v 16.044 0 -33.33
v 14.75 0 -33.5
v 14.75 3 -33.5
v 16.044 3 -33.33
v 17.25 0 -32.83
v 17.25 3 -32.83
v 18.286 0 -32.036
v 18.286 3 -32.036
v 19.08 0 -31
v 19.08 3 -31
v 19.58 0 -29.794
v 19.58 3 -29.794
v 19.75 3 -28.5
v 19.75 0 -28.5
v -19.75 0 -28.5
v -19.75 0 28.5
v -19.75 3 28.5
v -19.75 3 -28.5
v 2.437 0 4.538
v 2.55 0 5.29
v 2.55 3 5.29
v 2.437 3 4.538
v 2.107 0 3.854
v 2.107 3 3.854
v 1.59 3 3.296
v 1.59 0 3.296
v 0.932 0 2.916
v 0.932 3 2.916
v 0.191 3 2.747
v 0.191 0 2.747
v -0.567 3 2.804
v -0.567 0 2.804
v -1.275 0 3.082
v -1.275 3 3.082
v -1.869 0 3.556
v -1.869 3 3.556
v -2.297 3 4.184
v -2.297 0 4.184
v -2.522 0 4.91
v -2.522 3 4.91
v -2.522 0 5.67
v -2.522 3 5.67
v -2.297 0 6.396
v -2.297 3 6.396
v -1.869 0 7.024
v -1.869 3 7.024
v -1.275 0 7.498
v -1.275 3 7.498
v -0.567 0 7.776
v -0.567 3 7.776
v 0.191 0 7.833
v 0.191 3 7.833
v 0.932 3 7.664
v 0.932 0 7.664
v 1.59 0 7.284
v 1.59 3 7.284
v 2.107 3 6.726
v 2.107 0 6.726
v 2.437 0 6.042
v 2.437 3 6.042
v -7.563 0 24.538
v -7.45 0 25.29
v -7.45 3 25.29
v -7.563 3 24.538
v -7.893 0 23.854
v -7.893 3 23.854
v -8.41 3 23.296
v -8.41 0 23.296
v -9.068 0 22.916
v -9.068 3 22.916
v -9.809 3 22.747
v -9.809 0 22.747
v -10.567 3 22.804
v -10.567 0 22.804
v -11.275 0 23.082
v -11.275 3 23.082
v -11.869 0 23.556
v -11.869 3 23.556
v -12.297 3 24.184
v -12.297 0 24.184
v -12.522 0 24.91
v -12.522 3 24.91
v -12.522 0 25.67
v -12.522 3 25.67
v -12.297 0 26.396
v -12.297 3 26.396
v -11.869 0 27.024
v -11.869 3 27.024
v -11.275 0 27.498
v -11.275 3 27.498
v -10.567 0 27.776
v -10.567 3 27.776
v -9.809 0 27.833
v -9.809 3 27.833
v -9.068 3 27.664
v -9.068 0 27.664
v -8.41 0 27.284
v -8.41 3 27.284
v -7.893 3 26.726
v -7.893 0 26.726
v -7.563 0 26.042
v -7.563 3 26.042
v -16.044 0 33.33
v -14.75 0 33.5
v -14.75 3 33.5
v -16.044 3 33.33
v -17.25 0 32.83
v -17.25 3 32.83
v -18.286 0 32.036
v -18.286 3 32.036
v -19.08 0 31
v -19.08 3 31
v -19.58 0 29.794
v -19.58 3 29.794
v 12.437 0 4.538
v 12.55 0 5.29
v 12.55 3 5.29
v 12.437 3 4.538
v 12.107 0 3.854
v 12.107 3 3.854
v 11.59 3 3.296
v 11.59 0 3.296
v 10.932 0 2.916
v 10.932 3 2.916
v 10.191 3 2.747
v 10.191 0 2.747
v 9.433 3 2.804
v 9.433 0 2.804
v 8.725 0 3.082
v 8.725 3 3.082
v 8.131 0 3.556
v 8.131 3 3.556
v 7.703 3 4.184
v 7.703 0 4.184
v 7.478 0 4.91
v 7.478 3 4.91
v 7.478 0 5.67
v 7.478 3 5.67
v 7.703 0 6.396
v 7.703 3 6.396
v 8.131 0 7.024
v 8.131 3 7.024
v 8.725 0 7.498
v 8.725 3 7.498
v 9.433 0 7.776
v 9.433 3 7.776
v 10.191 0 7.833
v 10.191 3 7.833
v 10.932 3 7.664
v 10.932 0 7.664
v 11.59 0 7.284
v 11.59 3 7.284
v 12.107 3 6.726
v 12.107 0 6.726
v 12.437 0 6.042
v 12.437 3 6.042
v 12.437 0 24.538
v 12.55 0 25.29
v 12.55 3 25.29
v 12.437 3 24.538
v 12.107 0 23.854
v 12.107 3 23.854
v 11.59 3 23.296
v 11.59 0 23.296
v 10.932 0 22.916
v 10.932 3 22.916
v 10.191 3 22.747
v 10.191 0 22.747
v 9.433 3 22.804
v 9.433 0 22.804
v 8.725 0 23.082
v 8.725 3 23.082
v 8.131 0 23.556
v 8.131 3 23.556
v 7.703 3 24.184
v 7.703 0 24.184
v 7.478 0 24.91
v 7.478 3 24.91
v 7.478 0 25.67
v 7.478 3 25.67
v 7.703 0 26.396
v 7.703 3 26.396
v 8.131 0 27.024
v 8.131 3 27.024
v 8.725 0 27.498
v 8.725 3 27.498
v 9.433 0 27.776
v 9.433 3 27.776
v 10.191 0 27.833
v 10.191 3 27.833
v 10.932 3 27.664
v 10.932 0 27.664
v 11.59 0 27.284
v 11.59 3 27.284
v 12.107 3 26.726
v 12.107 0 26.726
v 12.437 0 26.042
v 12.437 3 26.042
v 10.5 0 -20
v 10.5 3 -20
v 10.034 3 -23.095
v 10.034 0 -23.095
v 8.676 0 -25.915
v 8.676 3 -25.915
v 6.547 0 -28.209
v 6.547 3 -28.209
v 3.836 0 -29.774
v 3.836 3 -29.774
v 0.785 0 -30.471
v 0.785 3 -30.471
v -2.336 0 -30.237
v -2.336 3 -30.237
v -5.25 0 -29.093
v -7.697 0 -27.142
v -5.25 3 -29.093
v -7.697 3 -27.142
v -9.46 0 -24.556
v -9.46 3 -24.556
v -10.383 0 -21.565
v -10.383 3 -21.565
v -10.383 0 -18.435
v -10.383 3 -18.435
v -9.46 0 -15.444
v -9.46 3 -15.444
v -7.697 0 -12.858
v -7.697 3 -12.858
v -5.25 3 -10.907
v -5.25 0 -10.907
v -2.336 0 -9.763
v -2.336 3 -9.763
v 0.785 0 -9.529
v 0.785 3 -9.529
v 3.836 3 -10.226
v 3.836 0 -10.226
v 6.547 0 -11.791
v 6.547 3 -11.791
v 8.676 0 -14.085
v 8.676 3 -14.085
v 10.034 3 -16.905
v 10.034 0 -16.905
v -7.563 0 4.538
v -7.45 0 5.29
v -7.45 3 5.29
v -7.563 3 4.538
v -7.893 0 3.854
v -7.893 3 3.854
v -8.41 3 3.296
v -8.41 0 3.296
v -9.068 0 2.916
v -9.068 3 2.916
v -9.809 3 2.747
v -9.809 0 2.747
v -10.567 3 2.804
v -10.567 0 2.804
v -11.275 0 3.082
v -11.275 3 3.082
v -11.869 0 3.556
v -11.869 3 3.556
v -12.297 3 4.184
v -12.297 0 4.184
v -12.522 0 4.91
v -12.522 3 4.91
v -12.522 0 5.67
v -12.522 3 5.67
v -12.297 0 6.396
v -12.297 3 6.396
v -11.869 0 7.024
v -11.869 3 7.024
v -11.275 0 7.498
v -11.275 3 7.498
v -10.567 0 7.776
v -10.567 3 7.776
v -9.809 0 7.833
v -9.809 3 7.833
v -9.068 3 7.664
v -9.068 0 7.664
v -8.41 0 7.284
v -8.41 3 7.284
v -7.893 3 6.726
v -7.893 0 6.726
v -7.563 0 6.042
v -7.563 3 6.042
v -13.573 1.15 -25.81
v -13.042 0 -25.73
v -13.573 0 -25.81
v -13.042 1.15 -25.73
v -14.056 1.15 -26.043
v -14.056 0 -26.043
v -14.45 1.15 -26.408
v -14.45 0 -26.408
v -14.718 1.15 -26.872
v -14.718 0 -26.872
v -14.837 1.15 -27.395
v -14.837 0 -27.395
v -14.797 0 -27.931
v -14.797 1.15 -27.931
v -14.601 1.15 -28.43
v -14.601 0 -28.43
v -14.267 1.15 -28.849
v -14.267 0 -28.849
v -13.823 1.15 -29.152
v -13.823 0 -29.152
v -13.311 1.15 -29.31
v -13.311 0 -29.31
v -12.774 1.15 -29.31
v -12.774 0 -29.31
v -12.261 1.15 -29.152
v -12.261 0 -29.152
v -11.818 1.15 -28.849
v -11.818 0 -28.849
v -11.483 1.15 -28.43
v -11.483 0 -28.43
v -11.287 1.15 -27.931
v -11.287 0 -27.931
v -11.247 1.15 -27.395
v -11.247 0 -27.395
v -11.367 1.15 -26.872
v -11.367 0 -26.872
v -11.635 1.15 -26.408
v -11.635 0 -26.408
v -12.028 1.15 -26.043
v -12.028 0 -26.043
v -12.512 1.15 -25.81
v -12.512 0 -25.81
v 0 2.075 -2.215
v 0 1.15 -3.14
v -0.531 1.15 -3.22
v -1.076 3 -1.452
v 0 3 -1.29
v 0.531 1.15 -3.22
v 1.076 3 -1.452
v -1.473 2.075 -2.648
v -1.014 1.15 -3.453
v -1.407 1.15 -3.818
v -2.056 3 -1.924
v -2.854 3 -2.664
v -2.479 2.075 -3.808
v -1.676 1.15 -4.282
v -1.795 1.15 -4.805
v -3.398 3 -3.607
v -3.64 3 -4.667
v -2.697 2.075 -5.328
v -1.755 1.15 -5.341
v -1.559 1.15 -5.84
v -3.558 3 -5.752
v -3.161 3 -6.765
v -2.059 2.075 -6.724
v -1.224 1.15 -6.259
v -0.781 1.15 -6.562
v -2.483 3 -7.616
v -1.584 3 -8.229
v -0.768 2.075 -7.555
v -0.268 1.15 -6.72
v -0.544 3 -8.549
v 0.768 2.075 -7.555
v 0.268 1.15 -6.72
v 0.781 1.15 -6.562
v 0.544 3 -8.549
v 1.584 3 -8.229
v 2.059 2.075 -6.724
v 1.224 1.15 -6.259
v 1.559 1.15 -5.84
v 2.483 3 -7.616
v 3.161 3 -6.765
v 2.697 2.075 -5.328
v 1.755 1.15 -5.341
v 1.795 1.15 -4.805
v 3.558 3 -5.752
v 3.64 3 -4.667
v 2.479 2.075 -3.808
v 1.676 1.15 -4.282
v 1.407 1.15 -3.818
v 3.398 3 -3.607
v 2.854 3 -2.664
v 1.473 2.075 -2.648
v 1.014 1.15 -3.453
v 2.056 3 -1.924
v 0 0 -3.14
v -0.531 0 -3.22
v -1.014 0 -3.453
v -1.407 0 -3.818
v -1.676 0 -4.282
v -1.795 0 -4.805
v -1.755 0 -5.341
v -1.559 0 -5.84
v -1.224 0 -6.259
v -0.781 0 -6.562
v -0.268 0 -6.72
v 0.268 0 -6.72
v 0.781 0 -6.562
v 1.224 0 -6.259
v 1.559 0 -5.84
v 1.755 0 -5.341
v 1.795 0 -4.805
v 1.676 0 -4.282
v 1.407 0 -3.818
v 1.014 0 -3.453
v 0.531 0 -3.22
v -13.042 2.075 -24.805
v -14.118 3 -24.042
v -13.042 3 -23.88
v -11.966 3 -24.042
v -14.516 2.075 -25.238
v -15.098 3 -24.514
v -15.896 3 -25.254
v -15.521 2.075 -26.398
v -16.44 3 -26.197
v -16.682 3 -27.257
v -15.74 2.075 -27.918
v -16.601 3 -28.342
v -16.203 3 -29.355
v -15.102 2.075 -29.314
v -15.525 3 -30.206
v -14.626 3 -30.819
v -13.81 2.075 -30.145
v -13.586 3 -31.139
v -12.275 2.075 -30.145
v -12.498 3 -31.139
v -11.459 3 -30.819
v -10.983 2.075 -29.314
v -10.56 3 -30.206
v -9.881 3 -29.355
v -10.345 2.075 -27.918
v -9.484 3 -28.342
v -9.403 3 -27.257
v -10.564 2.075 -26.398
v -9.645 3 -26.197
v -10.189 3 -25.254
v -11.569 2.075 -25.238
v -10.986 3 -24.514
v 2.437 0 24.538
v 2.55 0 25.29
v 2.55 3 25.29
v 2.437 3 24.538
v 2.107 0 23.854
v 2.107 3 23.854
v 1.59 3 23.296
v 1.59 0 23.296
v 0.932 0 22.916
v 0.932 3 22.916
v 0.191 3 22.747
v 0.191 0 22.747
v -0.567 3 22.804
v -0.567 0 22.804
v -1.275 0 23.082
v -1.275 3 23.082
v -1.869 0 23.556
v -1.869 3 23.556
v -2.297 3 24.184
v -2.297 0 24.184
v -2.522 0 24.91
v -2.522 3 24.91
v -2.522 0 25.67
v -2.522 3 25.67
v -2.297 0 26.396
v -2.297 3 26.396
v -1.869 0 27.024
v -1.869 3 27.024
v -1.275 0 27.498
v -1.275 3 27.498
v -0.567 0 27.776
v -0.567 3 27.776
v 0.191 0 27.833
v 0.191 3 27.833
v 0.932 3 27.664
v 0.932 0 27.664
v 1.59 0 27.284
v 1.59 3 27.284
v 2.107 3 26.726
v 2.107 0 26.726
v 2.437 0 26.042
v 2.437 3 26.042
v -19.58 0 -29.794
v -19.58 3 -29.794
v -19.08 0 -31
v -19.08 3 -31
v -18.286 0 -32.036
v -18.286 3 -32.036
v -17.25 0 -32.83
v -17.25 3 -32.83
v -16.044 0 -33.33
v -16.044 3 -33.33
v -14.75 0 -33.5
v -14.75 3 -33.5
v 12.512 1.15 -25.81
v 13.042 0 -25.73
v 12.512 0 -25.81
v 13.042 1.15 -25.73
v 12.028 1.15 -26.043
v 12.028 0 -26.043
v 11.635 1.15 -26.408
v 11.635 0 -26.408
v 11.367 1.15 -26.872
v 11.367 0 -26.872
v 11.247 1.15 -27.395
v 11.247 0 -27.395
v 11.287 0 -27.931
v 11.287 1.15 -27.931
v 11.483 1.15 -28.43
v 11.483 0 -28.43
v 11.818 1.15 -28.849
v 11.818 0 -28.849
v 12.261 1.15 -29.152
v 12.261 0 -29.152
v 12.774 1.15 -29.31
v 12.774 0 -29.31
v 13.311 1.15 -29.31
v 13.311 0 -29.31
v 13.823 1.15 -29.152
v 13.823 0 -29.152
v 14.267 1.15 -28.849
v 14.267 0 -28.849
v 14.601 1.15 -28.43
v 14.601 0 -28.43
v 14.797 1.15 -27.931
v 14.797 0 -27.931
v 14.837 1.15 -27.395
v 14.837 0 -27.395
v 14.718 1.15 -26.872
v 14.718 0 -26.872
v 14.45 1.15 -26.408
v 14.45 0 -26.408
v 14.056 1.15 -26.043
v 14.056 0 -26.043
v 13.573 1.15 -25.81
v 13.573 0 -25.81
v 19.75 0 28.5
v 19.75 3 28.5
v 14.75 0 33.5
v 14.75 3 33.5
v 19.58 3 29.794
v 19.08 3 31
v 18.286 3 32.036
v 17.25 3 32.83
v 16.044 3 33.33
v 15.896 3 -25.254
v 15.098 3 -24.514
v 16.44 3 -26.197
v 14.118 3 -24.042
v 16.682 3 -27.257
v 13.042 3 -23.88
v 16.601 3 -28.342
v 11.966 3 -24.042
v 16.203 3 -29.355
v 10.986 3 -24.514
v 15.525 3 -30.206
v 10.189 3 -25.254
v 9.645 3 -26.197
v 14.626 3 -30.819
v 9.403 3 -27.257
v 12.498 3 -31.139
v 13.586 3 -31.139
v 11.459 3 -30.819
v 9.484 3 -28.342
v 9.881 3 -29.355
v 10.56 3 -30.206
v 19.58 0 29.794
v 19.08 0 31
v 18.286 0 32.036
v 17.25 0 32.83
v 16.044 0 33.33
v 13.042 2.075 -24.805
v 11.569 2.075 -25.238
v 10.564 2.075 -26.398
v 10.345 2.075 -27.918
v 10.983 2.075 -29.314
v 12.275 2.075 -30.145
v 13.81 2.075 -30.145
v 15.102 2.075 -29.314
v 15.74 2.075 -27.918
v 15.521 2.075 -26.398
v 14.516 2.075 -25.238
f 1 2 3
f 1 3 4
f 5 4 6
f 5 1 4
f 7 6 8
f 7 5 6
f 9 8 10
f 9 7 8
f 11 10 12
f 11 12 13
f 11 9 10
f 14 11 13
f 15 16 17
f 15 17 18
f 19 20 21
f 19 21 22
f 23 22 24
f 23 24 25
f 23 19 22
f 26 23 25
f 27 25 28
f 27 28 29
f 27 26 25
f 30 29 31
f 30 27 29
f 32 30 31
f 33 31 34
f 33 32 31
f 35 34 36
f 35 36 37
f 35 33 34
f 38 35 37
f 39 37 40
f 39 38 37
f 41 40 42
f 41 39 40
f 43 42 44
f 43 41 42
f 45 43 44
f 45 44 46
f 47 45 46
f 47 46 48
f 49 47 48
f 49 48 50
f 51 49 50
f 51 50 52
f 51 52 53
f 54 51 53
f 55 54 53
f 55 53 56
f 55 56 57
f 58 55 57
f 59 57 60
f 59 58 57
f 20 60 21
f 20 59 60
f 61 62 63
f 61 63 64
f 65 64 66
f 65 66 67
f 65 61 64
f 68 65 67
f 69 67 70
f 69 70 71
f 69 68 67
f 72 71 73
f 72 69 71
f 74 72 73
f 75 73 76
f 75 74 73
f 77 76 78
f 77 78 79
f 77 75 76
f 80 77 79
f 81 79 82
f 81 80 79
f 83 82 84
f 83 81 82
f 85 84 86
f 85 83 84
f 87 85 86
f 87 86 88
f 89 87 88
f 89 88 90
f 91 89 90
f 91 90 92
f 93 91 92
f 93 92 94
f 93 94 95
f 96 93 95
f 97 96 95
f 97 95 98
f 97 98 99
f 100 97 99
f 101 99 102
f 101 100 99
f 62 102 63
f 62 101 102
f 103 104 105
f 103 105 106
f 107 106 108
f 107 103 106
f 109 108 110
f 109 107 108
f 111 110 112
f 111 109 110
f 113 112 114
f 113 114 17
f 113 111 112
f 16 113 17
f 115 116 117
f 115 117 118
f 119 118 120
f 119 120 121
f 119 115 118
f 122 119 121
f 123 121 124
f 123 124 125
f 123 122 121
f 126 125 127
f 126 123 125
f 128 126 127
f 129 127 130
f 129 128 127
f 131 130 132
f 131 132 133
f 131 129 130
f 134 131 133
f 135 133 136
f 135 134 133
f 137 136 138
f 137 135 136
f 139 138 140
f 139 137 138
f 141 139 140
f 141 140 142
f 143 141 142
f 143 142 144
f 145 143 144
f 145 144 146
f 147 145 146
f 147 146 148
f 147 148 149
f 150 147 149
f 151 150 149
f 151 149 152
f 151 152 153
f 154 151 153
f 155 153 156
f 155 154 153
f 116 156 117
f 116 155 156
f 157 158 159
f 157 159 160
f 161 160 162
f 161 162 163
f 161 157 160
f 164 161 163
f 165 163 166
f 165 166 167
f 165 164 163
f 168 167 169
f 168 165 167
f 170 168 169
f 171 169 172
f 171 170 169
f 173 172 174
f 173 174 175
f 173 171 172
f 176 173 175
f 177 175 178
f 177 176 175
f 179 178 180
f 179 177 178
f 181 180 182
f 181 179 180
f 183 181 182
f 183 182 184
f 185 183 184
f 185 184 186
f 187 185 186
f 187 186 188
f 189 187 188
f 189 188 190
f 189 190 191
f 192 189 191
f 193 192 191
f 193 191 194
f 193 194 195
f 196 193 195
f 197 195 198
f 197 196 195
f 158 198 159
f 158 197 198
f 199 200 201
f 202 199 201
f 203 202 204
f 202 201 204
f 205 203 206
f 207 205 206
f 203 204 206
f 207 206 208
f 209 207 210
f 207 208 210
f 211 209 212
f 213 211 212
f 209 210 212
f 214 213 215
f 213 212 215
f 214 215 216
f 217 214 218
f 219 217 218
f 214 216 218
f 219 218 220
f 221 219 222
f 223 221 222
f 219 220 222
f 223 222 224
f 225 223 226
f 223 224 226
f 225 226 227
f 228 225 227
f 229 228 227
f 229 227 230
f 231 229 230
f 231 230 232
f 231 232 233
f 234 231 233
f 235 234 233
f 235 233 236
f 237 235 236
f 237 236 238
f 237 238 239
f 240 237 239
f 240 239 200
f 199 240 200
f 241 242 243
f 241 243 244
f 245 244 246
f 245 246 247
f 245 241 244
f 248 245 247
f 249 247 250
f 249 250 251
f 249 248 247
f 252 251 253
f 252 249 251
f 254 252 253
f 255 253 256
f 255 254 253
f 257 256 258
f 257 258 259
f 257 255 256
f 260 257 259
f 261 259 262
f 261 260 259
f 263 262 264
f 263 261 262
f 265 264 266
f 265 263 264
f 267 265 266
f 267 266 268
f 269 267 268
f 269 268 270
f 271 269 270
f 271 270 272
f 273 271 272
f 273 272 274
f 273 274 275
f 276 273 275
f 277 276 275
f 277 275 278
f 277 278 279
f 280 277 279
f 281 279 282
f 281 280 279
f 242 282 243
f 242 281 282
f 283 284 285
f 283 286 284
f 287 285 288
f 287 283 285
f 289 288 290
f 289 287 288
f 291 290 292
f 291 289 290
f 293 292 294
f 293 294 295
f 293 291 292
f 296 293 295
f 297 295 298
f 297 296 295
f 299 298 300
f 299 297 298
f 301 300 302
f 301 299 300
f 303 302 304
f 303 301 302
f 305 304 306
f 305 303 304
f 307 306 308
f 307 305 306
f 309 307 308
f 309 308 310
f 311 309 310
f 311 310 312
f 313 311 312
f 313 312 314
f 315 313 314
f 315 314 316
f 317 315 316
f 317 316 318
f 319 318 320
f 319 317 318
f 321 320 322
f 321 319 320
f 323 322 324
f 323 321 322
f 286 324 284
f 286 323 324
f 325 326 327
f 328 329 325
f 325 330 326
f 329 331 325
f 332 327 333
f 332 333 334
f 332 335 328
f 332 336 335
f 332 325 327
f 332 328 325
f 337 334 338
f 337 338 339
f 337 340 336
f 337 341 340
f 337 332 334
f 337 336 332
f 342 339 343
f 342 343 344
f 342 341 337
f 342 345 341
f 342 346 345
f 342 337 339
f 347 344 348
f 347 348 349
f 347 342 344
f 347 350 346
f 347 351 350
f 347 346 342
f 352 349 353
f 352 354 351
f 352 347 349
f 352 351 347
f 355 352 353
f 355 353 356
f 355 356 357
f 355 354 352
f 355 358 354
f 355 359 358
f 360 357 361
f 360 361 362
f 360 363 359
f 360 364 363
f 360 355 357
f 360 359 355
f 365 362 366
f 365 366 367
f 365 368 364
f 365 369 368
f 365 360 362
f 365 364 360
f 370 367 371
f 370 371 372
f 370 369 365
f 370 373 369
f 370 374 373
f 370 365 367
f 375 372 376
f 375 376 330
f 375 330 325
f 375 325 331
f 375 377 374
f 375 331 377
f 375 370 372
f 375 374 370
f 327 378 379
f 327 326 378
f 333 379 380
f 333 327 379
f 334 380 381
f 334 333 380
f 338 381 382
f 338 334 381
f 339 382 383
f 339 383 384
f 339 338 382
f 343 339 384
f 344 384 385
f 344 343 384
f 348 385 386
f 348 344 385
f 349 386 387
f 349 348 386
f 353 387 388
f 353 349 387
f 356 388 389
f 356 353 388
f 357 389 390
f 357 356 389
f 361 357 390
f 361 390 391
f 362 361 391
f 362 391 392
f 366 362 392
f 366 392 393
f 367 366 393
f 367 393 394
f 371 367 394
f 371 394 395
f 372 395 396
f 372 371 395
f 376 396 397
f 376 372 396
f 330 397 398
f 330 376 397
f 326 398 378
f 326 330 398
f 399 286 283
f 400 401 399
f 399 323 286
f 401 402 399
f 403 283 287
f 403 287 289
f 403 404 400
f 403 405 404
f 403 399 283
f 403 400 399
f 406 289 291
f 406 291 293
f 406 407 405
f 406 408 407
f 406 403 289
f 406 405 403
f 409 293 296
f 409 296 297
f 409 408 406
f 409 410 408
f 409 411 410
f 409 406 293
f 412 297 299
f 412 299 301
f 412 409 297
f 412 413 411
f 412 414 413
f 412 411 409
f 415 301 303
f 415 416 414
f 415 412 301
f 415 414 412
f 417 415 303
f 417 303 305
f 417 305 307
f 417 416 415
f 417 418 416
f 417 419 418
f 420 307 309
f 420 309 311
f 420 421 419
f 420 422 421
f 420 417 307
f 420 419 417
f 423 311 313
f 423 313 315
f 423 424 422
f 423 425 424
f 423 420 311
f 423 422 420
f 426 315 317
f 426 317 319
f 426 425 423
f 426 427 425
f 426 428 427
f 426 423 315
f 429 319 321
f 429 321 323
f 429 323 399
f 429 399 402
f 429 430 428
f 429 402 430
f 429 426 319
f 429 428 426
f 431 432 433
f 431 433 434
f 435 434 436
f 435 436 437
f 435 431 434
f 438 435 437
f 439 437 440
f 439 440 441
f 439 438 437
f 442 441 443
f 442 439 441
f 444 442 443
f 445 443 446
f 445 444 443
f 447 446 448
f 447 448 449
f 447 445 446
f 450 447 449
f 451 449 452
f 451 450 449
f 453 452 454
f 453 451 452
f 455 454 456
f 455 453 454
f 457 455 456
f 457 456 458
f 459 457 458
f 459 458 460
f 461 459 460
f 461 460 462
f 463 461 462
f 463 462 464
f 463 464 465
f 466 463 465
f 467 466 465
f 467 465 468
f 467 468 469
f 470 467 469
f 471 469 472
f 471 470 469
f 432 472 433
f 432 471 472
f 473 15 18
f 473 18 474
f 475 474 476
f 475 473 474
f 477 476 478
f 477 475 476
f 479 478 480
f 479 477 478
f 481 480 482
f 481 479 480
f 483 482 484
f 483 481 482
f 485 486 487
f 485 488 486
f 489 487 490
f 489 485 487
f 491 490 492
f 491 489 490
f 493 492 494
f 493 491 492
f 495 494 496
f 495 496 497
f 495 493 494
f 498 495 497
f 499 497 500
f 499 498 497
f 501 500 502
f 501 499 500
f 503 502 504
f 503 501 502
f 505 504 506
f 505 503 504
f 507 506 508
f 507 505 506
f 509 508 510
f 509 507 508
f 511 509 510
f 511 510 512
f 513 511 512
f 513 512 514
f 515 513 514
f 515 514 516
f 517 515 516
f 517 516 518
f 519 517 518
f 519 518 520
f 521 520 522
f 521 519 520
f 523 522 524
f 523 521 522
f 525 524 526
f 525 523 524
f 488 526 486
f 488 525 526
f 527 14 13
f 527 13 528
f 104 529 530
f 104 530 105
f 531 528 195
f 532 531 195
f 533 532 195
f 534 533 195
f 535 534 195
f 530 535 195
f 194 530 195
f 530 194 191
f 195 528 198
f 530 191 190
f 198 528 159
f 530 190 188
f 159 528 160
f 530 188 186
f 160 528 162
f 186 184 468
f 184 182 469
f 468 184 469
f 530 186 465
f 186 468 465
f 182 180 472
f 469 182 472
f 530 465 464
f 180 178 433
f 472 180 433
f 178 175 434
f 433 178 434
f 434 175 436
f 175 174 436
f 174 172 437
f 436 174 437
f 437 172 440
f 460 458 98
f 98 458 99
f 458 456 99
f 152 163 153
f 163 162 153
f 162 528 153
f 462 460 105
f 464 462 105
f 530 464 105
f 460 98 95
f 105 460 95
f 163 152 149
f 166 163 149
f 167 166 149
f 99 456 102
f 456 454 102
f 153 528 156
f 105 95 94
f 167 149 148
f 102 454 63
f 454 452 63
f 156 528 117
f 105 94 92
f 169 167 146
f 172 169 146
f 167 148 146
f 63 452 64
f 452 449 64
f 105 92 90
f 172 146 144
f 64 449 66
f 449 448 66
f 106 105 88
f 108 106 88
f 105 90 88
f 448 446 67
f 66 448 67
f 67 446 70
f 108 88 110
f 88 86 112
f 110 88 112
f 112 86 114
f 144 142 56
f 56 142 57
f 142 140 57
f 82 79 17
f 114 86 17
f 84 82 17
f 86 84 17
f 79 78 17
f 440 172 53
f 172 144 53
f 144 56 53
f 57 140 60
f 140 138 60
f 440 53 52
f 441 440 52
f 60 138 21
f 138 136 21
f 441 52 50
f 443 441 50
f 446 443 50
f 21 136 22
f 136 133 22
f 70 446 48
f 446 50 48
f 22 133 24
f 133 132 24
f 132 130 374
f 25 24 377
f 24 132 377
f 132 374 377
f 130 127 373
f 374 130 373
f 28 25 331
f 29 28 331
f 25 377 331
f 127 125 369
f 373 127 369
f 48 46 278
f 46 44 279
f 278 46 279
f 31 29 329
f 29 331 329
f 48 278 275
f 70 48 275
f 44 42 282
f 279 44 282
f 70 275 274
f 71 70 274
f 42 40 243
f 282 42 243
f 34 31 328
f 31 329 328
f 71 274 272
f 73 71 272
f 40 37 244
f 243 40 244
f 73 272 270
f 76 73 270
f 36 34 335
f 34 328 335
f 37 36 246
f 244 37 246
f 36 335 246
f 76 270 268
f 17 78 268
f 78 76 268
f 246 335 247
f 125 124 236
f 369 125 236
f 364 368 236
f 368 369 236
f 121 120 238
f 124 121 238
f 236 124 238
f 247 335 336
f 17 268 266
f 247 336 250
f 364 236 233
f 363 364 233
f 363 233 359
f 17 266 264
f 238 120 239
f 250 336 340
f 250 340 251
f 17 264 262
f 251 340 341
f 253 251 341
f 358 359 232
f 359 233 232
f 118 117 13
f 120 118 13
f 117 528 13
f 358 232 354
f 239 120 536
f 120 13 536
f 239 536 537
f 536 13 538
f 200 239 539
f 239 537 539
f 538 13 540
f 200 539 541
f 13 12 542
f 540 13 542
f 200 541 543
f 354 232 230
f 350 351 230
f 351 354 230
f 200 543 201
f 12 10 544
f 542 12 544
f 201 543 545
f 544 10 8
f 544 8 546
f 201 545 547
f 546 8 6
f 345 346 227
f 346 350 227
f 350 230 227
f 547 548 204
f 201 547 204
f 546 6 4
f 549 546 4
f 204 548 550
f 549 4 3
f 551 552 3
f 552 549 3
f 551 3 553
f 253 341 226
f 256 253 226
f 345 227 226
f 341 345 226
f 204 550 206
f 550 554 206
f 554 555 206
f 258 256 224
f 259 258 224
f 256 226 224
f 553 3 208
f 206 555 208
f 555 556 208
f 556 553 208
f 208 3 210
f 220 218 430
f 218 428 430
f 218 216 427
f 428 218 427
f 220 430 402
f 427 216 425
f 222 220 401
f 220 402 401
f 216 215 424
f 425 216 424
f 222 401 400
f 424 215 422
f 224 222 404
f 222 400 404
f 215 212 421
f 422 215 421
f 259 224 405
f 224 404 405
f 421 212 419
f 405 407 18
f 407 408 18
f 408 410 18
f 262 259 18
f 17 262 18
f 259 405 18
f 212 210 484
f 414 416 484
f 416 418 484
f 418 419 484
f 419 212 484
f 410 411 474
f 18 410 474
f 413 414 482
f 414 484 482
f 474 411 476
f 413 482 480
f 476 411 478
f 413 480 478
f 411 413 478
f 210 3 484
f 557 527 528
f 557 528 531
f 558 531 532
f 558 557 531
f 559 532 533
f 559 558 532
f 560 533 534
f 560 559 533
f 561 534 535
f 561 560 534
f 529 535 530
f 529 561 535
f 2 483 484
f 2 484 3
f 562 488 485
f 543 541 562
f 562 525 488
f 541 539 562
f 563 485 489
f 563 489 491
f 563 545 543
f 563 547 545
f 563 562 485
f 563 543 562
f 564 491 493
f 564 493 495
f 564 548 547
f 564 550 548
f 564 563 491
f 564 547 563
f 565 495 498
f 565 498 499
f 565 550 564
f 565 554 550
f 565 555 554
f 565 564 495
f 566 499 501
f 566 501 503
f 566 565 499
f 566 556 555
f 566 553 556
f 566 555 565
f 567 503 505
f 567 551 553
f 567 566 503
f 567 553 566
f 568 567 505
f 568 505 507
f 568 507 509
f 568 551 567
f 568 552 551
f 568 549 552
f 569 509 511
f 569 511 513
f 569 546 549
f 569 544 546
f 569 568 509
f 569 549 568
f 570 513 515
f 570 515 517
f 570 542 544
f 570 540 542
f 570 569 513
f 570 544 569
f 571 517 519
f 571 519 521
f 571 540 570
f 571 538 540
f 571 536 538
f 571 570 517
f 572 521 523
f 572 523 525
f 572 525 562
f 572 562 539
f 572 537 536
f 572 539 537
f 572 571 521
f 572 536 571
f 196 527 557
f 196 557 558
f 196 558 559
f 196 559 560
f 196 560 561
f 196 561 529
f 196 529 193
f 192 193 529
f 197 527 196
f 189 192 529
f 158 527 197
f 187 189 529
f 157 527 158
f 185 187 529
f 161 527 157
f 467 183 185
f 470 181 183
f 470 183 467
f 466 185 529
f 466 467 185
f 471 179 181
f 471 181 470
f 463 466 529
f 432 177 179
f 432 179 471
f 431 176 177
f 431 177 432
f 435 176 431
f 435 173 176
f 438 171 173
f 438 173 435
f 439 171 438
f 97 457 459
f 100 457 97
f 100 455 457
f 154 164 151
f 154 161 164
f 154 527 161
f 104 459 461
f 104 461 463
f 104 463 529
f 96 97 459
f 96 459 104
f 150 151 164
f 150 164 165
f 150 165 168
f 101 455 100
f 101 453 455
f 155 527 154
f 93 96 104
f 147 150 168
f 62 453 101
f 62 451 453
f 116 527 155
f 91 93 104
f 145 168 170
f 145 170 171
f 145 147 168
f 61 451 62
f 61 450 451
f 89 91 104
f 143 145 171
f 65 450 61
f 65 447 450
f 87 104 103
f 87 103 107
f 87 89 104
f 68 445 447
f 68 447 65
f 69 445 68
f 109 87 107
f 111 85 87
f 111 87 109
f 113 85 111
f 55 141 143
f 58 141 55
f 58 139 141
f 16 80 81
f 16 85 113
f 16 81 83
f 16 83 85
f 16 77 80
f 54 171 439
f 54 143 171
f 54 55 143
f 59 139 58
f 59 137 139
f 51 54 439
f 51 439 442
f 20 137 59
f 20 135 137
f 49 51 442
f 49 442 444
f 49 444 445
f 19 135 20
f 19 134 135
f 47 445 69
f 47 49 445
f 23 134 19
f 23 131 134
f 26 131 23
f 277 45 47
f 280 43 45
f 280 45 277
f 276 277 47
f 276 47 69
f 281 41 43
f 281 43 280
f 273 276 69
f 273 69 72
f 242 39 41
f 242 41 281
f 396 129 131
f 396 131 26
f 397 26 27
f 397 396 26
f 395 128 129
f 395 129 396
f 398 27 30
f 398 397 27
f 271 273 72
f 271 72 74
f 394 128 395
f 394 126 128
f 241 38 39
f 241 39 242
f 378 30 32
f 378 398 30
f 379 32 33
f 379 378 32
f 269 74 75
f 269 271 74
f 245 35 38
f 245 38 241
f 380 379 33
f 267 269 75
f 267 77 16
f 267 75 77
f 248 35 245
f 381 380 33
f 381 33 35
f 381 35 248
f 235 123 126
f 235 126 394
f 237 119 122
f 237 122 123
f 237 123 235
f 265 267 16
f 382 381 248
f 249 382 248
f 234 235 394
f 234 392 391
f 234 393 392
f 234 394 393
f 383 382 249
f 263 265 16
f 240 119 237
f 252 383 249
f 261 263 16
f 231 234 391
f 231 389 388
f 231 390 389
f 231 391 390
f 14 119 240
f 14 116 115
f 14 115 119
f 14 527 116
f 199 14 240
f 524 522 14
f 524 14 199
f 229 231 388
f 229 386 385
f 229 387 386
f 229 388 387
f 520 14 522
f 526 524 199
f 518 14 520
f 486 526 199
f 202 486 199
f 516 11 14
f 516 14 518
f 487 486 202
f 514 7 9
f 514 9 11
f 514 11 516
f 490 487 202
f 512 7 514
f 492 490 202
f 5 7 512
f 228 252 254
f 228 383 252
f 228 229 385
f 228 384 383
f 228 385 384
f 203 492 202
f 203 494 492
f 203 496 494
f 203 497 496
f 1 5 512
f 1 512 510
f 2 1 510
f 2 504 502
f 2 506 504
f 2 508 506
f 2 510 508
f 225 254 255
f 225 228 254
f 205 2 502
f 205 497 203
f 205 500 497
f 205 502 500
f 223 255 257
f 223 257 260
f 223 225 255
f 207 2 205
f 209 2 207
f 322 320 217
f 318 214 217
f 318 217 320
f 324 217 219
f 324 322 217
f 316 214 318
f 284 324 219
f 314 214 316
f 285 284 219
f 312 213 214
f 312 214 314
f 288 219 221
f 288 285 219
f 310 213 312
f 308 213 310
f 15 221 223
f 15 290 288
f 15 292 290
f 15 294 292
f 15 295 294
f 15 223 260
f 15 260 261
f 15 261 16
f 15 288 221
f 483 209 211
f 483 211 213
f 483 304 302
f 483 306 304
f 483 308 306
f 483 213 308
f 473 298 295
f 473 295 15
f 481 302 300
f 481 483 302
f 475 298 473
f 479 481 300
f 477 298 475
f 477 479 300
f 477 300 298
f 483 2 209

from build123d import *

# Parameters (mm, degrees)
SKETCH1_R                                      = 2.55
BOSS_EXTRUDE1_DEPTH                            = 3
SKETCH2_R                                      = 10.5
CUT_EXTRUDE2_DEPTH                             = 4
CSK_FOR_M3_FLAT_HEAD_MACHINE_SCREW1_AT_2_COUNT = 2
CSK_FOR_M3_FLAT_HEAD_MACHINE_SCREW1_AT_2_PITCH = 26.084685162
CSK_FOR_M3_FLAT_HEAD_MACHINE_SCREW1_AT_3_COUNT = 2
CSK_FOR_M3_FLAT_HEAD_MACHINE_SCREW1_AT_3_PITCH = 26.084685162


with BuildPart() as part:
    # Sketch1 → Boss-Extrude1 (new body)
    with BuildSketch(Plane(origin=(0, 0, 0), x_dir=(1, 0, 0), z_dir=(0, 1, 0))):
        with BuildLine():
            Line((14.75, -33.5), (-14.75, -33.5))
            ThreePointArc((-14.75, -33.5), (-18.285533906, -32.035533906), (-19.75, -28.5))
            Line((-19.75, -28.5), (-19.75, 28.5))
            ThreePointArc((-19.75, 28.5), (-18.285533906, 32.035533906), (-14.75, 33.5))
            Line((-14.75, 33.5), (14.75, 33.5))
            ThreePointArc((14.75, 33.5), (18.285533906, 32.035533906), (19.75, 28.5))
            Line((19.75, 28.5), (19.75, -28.5))
            ThreePointArc((19.75, -28.5), (18.285533906, -32.035533906), (14.75, -33.5))
        make_face()
        with Locations((0, 26.5)):
            Circle(SKETCH1_R, mode=Mode.SUBTRACT)
        with Locations((10, -25.29)):
            Circle(SKETCH1_R, mode=Mode.SUBTRACT)
        with Locations((10, -5.29)):
            Circle(SKETCH1_R, mode=Mode.SUBTRACT)
        with Locations((0, -25.29)):
            Circle(SKETCH1_R, mode=Mode.SUBTRACT)
        with Locations((0, -5.29)):
            Circle(SKETCH1_R, mode=Mode.SUBTRACT)
        with Locations((-10, -25.29)):
            Circle(SKETCH1_R, mode=Mode.SUBTRACT)
        with Locations((-10, -5.29)):
            Circle(SKETCH1_R, mode=Mode.SUBTRACT)
    extrude(amount=BOSS_EXTRUDE1_DEPTH)

    # Sketch2 → Cut-Extrude2 (cut, through all)
    with BuildSketch(Plane(origin=(0, 3, 0), x_dir=(1, 0, 0), z_dir=(0, 1, 0))):
        with Locations((0, 20)):
            Circle(SKETCH2_R)
    extrude(amount=-CUT_EXTRUDE2_DEPTH, mode=Mode.SUBTRACT)

    # Sketch4 → CSK for M3 Flat Head Machine Screw1 (revolve, cut)
    with BuildSketch(Plane(origin=(-13.042342581, 3, -27.53), x_dir=(0, 0, 1), z_dir=(1, 0, 0))):
        Polygon((0, 0), (0, 3), (1.8, 3), (1.8, 1.85), (3.65, 0), align=None)
    csk_for_m3_flat_head_machine_screw1 = revolve(axis=Axis((-13.042342581, 9.35, -27.53), (0, -1, 0)), mode=Mode.SUBTRACT)

    # CSK for M3 Flat Head Machine Screw1 at 2: CSK for M3 Flat Head Machine Screw1 ×2
    with Locations(*[(i * CSK_FOR_M3_FLAT_HEAD_MACHINE_SCREW1_AT_2_PITCH, 0, 0) for i in range(1, CSK_FOR_M3_FLAT_HEAD_MACHINE_SCREW1_AT_2_COUNT)]):
        add(csk_for_m3_flat_head_machine_screw1, mode=Mode.SUBTRACT)

    # CSK for M3 Flat Head Machine Screw1 at 3: CSK for M3 Flat Head Machine Screw1 ×2
    with Locations(*[Vector(0.5, 0, 0.866025404) * (i * CSK_FOR_M3_FLAT_HEAD_MACHINE_SCREW1_AT_3_PITCH) for i in range(1, CSK_FOR_M3_FLAT_HEAD_MACHINE_SCREW1_AT_3_COUNT)]):
        add(csk_for_m3_flat_head_machine_screw1, mode=Mode.SUBTRACT)


solid = part.part
